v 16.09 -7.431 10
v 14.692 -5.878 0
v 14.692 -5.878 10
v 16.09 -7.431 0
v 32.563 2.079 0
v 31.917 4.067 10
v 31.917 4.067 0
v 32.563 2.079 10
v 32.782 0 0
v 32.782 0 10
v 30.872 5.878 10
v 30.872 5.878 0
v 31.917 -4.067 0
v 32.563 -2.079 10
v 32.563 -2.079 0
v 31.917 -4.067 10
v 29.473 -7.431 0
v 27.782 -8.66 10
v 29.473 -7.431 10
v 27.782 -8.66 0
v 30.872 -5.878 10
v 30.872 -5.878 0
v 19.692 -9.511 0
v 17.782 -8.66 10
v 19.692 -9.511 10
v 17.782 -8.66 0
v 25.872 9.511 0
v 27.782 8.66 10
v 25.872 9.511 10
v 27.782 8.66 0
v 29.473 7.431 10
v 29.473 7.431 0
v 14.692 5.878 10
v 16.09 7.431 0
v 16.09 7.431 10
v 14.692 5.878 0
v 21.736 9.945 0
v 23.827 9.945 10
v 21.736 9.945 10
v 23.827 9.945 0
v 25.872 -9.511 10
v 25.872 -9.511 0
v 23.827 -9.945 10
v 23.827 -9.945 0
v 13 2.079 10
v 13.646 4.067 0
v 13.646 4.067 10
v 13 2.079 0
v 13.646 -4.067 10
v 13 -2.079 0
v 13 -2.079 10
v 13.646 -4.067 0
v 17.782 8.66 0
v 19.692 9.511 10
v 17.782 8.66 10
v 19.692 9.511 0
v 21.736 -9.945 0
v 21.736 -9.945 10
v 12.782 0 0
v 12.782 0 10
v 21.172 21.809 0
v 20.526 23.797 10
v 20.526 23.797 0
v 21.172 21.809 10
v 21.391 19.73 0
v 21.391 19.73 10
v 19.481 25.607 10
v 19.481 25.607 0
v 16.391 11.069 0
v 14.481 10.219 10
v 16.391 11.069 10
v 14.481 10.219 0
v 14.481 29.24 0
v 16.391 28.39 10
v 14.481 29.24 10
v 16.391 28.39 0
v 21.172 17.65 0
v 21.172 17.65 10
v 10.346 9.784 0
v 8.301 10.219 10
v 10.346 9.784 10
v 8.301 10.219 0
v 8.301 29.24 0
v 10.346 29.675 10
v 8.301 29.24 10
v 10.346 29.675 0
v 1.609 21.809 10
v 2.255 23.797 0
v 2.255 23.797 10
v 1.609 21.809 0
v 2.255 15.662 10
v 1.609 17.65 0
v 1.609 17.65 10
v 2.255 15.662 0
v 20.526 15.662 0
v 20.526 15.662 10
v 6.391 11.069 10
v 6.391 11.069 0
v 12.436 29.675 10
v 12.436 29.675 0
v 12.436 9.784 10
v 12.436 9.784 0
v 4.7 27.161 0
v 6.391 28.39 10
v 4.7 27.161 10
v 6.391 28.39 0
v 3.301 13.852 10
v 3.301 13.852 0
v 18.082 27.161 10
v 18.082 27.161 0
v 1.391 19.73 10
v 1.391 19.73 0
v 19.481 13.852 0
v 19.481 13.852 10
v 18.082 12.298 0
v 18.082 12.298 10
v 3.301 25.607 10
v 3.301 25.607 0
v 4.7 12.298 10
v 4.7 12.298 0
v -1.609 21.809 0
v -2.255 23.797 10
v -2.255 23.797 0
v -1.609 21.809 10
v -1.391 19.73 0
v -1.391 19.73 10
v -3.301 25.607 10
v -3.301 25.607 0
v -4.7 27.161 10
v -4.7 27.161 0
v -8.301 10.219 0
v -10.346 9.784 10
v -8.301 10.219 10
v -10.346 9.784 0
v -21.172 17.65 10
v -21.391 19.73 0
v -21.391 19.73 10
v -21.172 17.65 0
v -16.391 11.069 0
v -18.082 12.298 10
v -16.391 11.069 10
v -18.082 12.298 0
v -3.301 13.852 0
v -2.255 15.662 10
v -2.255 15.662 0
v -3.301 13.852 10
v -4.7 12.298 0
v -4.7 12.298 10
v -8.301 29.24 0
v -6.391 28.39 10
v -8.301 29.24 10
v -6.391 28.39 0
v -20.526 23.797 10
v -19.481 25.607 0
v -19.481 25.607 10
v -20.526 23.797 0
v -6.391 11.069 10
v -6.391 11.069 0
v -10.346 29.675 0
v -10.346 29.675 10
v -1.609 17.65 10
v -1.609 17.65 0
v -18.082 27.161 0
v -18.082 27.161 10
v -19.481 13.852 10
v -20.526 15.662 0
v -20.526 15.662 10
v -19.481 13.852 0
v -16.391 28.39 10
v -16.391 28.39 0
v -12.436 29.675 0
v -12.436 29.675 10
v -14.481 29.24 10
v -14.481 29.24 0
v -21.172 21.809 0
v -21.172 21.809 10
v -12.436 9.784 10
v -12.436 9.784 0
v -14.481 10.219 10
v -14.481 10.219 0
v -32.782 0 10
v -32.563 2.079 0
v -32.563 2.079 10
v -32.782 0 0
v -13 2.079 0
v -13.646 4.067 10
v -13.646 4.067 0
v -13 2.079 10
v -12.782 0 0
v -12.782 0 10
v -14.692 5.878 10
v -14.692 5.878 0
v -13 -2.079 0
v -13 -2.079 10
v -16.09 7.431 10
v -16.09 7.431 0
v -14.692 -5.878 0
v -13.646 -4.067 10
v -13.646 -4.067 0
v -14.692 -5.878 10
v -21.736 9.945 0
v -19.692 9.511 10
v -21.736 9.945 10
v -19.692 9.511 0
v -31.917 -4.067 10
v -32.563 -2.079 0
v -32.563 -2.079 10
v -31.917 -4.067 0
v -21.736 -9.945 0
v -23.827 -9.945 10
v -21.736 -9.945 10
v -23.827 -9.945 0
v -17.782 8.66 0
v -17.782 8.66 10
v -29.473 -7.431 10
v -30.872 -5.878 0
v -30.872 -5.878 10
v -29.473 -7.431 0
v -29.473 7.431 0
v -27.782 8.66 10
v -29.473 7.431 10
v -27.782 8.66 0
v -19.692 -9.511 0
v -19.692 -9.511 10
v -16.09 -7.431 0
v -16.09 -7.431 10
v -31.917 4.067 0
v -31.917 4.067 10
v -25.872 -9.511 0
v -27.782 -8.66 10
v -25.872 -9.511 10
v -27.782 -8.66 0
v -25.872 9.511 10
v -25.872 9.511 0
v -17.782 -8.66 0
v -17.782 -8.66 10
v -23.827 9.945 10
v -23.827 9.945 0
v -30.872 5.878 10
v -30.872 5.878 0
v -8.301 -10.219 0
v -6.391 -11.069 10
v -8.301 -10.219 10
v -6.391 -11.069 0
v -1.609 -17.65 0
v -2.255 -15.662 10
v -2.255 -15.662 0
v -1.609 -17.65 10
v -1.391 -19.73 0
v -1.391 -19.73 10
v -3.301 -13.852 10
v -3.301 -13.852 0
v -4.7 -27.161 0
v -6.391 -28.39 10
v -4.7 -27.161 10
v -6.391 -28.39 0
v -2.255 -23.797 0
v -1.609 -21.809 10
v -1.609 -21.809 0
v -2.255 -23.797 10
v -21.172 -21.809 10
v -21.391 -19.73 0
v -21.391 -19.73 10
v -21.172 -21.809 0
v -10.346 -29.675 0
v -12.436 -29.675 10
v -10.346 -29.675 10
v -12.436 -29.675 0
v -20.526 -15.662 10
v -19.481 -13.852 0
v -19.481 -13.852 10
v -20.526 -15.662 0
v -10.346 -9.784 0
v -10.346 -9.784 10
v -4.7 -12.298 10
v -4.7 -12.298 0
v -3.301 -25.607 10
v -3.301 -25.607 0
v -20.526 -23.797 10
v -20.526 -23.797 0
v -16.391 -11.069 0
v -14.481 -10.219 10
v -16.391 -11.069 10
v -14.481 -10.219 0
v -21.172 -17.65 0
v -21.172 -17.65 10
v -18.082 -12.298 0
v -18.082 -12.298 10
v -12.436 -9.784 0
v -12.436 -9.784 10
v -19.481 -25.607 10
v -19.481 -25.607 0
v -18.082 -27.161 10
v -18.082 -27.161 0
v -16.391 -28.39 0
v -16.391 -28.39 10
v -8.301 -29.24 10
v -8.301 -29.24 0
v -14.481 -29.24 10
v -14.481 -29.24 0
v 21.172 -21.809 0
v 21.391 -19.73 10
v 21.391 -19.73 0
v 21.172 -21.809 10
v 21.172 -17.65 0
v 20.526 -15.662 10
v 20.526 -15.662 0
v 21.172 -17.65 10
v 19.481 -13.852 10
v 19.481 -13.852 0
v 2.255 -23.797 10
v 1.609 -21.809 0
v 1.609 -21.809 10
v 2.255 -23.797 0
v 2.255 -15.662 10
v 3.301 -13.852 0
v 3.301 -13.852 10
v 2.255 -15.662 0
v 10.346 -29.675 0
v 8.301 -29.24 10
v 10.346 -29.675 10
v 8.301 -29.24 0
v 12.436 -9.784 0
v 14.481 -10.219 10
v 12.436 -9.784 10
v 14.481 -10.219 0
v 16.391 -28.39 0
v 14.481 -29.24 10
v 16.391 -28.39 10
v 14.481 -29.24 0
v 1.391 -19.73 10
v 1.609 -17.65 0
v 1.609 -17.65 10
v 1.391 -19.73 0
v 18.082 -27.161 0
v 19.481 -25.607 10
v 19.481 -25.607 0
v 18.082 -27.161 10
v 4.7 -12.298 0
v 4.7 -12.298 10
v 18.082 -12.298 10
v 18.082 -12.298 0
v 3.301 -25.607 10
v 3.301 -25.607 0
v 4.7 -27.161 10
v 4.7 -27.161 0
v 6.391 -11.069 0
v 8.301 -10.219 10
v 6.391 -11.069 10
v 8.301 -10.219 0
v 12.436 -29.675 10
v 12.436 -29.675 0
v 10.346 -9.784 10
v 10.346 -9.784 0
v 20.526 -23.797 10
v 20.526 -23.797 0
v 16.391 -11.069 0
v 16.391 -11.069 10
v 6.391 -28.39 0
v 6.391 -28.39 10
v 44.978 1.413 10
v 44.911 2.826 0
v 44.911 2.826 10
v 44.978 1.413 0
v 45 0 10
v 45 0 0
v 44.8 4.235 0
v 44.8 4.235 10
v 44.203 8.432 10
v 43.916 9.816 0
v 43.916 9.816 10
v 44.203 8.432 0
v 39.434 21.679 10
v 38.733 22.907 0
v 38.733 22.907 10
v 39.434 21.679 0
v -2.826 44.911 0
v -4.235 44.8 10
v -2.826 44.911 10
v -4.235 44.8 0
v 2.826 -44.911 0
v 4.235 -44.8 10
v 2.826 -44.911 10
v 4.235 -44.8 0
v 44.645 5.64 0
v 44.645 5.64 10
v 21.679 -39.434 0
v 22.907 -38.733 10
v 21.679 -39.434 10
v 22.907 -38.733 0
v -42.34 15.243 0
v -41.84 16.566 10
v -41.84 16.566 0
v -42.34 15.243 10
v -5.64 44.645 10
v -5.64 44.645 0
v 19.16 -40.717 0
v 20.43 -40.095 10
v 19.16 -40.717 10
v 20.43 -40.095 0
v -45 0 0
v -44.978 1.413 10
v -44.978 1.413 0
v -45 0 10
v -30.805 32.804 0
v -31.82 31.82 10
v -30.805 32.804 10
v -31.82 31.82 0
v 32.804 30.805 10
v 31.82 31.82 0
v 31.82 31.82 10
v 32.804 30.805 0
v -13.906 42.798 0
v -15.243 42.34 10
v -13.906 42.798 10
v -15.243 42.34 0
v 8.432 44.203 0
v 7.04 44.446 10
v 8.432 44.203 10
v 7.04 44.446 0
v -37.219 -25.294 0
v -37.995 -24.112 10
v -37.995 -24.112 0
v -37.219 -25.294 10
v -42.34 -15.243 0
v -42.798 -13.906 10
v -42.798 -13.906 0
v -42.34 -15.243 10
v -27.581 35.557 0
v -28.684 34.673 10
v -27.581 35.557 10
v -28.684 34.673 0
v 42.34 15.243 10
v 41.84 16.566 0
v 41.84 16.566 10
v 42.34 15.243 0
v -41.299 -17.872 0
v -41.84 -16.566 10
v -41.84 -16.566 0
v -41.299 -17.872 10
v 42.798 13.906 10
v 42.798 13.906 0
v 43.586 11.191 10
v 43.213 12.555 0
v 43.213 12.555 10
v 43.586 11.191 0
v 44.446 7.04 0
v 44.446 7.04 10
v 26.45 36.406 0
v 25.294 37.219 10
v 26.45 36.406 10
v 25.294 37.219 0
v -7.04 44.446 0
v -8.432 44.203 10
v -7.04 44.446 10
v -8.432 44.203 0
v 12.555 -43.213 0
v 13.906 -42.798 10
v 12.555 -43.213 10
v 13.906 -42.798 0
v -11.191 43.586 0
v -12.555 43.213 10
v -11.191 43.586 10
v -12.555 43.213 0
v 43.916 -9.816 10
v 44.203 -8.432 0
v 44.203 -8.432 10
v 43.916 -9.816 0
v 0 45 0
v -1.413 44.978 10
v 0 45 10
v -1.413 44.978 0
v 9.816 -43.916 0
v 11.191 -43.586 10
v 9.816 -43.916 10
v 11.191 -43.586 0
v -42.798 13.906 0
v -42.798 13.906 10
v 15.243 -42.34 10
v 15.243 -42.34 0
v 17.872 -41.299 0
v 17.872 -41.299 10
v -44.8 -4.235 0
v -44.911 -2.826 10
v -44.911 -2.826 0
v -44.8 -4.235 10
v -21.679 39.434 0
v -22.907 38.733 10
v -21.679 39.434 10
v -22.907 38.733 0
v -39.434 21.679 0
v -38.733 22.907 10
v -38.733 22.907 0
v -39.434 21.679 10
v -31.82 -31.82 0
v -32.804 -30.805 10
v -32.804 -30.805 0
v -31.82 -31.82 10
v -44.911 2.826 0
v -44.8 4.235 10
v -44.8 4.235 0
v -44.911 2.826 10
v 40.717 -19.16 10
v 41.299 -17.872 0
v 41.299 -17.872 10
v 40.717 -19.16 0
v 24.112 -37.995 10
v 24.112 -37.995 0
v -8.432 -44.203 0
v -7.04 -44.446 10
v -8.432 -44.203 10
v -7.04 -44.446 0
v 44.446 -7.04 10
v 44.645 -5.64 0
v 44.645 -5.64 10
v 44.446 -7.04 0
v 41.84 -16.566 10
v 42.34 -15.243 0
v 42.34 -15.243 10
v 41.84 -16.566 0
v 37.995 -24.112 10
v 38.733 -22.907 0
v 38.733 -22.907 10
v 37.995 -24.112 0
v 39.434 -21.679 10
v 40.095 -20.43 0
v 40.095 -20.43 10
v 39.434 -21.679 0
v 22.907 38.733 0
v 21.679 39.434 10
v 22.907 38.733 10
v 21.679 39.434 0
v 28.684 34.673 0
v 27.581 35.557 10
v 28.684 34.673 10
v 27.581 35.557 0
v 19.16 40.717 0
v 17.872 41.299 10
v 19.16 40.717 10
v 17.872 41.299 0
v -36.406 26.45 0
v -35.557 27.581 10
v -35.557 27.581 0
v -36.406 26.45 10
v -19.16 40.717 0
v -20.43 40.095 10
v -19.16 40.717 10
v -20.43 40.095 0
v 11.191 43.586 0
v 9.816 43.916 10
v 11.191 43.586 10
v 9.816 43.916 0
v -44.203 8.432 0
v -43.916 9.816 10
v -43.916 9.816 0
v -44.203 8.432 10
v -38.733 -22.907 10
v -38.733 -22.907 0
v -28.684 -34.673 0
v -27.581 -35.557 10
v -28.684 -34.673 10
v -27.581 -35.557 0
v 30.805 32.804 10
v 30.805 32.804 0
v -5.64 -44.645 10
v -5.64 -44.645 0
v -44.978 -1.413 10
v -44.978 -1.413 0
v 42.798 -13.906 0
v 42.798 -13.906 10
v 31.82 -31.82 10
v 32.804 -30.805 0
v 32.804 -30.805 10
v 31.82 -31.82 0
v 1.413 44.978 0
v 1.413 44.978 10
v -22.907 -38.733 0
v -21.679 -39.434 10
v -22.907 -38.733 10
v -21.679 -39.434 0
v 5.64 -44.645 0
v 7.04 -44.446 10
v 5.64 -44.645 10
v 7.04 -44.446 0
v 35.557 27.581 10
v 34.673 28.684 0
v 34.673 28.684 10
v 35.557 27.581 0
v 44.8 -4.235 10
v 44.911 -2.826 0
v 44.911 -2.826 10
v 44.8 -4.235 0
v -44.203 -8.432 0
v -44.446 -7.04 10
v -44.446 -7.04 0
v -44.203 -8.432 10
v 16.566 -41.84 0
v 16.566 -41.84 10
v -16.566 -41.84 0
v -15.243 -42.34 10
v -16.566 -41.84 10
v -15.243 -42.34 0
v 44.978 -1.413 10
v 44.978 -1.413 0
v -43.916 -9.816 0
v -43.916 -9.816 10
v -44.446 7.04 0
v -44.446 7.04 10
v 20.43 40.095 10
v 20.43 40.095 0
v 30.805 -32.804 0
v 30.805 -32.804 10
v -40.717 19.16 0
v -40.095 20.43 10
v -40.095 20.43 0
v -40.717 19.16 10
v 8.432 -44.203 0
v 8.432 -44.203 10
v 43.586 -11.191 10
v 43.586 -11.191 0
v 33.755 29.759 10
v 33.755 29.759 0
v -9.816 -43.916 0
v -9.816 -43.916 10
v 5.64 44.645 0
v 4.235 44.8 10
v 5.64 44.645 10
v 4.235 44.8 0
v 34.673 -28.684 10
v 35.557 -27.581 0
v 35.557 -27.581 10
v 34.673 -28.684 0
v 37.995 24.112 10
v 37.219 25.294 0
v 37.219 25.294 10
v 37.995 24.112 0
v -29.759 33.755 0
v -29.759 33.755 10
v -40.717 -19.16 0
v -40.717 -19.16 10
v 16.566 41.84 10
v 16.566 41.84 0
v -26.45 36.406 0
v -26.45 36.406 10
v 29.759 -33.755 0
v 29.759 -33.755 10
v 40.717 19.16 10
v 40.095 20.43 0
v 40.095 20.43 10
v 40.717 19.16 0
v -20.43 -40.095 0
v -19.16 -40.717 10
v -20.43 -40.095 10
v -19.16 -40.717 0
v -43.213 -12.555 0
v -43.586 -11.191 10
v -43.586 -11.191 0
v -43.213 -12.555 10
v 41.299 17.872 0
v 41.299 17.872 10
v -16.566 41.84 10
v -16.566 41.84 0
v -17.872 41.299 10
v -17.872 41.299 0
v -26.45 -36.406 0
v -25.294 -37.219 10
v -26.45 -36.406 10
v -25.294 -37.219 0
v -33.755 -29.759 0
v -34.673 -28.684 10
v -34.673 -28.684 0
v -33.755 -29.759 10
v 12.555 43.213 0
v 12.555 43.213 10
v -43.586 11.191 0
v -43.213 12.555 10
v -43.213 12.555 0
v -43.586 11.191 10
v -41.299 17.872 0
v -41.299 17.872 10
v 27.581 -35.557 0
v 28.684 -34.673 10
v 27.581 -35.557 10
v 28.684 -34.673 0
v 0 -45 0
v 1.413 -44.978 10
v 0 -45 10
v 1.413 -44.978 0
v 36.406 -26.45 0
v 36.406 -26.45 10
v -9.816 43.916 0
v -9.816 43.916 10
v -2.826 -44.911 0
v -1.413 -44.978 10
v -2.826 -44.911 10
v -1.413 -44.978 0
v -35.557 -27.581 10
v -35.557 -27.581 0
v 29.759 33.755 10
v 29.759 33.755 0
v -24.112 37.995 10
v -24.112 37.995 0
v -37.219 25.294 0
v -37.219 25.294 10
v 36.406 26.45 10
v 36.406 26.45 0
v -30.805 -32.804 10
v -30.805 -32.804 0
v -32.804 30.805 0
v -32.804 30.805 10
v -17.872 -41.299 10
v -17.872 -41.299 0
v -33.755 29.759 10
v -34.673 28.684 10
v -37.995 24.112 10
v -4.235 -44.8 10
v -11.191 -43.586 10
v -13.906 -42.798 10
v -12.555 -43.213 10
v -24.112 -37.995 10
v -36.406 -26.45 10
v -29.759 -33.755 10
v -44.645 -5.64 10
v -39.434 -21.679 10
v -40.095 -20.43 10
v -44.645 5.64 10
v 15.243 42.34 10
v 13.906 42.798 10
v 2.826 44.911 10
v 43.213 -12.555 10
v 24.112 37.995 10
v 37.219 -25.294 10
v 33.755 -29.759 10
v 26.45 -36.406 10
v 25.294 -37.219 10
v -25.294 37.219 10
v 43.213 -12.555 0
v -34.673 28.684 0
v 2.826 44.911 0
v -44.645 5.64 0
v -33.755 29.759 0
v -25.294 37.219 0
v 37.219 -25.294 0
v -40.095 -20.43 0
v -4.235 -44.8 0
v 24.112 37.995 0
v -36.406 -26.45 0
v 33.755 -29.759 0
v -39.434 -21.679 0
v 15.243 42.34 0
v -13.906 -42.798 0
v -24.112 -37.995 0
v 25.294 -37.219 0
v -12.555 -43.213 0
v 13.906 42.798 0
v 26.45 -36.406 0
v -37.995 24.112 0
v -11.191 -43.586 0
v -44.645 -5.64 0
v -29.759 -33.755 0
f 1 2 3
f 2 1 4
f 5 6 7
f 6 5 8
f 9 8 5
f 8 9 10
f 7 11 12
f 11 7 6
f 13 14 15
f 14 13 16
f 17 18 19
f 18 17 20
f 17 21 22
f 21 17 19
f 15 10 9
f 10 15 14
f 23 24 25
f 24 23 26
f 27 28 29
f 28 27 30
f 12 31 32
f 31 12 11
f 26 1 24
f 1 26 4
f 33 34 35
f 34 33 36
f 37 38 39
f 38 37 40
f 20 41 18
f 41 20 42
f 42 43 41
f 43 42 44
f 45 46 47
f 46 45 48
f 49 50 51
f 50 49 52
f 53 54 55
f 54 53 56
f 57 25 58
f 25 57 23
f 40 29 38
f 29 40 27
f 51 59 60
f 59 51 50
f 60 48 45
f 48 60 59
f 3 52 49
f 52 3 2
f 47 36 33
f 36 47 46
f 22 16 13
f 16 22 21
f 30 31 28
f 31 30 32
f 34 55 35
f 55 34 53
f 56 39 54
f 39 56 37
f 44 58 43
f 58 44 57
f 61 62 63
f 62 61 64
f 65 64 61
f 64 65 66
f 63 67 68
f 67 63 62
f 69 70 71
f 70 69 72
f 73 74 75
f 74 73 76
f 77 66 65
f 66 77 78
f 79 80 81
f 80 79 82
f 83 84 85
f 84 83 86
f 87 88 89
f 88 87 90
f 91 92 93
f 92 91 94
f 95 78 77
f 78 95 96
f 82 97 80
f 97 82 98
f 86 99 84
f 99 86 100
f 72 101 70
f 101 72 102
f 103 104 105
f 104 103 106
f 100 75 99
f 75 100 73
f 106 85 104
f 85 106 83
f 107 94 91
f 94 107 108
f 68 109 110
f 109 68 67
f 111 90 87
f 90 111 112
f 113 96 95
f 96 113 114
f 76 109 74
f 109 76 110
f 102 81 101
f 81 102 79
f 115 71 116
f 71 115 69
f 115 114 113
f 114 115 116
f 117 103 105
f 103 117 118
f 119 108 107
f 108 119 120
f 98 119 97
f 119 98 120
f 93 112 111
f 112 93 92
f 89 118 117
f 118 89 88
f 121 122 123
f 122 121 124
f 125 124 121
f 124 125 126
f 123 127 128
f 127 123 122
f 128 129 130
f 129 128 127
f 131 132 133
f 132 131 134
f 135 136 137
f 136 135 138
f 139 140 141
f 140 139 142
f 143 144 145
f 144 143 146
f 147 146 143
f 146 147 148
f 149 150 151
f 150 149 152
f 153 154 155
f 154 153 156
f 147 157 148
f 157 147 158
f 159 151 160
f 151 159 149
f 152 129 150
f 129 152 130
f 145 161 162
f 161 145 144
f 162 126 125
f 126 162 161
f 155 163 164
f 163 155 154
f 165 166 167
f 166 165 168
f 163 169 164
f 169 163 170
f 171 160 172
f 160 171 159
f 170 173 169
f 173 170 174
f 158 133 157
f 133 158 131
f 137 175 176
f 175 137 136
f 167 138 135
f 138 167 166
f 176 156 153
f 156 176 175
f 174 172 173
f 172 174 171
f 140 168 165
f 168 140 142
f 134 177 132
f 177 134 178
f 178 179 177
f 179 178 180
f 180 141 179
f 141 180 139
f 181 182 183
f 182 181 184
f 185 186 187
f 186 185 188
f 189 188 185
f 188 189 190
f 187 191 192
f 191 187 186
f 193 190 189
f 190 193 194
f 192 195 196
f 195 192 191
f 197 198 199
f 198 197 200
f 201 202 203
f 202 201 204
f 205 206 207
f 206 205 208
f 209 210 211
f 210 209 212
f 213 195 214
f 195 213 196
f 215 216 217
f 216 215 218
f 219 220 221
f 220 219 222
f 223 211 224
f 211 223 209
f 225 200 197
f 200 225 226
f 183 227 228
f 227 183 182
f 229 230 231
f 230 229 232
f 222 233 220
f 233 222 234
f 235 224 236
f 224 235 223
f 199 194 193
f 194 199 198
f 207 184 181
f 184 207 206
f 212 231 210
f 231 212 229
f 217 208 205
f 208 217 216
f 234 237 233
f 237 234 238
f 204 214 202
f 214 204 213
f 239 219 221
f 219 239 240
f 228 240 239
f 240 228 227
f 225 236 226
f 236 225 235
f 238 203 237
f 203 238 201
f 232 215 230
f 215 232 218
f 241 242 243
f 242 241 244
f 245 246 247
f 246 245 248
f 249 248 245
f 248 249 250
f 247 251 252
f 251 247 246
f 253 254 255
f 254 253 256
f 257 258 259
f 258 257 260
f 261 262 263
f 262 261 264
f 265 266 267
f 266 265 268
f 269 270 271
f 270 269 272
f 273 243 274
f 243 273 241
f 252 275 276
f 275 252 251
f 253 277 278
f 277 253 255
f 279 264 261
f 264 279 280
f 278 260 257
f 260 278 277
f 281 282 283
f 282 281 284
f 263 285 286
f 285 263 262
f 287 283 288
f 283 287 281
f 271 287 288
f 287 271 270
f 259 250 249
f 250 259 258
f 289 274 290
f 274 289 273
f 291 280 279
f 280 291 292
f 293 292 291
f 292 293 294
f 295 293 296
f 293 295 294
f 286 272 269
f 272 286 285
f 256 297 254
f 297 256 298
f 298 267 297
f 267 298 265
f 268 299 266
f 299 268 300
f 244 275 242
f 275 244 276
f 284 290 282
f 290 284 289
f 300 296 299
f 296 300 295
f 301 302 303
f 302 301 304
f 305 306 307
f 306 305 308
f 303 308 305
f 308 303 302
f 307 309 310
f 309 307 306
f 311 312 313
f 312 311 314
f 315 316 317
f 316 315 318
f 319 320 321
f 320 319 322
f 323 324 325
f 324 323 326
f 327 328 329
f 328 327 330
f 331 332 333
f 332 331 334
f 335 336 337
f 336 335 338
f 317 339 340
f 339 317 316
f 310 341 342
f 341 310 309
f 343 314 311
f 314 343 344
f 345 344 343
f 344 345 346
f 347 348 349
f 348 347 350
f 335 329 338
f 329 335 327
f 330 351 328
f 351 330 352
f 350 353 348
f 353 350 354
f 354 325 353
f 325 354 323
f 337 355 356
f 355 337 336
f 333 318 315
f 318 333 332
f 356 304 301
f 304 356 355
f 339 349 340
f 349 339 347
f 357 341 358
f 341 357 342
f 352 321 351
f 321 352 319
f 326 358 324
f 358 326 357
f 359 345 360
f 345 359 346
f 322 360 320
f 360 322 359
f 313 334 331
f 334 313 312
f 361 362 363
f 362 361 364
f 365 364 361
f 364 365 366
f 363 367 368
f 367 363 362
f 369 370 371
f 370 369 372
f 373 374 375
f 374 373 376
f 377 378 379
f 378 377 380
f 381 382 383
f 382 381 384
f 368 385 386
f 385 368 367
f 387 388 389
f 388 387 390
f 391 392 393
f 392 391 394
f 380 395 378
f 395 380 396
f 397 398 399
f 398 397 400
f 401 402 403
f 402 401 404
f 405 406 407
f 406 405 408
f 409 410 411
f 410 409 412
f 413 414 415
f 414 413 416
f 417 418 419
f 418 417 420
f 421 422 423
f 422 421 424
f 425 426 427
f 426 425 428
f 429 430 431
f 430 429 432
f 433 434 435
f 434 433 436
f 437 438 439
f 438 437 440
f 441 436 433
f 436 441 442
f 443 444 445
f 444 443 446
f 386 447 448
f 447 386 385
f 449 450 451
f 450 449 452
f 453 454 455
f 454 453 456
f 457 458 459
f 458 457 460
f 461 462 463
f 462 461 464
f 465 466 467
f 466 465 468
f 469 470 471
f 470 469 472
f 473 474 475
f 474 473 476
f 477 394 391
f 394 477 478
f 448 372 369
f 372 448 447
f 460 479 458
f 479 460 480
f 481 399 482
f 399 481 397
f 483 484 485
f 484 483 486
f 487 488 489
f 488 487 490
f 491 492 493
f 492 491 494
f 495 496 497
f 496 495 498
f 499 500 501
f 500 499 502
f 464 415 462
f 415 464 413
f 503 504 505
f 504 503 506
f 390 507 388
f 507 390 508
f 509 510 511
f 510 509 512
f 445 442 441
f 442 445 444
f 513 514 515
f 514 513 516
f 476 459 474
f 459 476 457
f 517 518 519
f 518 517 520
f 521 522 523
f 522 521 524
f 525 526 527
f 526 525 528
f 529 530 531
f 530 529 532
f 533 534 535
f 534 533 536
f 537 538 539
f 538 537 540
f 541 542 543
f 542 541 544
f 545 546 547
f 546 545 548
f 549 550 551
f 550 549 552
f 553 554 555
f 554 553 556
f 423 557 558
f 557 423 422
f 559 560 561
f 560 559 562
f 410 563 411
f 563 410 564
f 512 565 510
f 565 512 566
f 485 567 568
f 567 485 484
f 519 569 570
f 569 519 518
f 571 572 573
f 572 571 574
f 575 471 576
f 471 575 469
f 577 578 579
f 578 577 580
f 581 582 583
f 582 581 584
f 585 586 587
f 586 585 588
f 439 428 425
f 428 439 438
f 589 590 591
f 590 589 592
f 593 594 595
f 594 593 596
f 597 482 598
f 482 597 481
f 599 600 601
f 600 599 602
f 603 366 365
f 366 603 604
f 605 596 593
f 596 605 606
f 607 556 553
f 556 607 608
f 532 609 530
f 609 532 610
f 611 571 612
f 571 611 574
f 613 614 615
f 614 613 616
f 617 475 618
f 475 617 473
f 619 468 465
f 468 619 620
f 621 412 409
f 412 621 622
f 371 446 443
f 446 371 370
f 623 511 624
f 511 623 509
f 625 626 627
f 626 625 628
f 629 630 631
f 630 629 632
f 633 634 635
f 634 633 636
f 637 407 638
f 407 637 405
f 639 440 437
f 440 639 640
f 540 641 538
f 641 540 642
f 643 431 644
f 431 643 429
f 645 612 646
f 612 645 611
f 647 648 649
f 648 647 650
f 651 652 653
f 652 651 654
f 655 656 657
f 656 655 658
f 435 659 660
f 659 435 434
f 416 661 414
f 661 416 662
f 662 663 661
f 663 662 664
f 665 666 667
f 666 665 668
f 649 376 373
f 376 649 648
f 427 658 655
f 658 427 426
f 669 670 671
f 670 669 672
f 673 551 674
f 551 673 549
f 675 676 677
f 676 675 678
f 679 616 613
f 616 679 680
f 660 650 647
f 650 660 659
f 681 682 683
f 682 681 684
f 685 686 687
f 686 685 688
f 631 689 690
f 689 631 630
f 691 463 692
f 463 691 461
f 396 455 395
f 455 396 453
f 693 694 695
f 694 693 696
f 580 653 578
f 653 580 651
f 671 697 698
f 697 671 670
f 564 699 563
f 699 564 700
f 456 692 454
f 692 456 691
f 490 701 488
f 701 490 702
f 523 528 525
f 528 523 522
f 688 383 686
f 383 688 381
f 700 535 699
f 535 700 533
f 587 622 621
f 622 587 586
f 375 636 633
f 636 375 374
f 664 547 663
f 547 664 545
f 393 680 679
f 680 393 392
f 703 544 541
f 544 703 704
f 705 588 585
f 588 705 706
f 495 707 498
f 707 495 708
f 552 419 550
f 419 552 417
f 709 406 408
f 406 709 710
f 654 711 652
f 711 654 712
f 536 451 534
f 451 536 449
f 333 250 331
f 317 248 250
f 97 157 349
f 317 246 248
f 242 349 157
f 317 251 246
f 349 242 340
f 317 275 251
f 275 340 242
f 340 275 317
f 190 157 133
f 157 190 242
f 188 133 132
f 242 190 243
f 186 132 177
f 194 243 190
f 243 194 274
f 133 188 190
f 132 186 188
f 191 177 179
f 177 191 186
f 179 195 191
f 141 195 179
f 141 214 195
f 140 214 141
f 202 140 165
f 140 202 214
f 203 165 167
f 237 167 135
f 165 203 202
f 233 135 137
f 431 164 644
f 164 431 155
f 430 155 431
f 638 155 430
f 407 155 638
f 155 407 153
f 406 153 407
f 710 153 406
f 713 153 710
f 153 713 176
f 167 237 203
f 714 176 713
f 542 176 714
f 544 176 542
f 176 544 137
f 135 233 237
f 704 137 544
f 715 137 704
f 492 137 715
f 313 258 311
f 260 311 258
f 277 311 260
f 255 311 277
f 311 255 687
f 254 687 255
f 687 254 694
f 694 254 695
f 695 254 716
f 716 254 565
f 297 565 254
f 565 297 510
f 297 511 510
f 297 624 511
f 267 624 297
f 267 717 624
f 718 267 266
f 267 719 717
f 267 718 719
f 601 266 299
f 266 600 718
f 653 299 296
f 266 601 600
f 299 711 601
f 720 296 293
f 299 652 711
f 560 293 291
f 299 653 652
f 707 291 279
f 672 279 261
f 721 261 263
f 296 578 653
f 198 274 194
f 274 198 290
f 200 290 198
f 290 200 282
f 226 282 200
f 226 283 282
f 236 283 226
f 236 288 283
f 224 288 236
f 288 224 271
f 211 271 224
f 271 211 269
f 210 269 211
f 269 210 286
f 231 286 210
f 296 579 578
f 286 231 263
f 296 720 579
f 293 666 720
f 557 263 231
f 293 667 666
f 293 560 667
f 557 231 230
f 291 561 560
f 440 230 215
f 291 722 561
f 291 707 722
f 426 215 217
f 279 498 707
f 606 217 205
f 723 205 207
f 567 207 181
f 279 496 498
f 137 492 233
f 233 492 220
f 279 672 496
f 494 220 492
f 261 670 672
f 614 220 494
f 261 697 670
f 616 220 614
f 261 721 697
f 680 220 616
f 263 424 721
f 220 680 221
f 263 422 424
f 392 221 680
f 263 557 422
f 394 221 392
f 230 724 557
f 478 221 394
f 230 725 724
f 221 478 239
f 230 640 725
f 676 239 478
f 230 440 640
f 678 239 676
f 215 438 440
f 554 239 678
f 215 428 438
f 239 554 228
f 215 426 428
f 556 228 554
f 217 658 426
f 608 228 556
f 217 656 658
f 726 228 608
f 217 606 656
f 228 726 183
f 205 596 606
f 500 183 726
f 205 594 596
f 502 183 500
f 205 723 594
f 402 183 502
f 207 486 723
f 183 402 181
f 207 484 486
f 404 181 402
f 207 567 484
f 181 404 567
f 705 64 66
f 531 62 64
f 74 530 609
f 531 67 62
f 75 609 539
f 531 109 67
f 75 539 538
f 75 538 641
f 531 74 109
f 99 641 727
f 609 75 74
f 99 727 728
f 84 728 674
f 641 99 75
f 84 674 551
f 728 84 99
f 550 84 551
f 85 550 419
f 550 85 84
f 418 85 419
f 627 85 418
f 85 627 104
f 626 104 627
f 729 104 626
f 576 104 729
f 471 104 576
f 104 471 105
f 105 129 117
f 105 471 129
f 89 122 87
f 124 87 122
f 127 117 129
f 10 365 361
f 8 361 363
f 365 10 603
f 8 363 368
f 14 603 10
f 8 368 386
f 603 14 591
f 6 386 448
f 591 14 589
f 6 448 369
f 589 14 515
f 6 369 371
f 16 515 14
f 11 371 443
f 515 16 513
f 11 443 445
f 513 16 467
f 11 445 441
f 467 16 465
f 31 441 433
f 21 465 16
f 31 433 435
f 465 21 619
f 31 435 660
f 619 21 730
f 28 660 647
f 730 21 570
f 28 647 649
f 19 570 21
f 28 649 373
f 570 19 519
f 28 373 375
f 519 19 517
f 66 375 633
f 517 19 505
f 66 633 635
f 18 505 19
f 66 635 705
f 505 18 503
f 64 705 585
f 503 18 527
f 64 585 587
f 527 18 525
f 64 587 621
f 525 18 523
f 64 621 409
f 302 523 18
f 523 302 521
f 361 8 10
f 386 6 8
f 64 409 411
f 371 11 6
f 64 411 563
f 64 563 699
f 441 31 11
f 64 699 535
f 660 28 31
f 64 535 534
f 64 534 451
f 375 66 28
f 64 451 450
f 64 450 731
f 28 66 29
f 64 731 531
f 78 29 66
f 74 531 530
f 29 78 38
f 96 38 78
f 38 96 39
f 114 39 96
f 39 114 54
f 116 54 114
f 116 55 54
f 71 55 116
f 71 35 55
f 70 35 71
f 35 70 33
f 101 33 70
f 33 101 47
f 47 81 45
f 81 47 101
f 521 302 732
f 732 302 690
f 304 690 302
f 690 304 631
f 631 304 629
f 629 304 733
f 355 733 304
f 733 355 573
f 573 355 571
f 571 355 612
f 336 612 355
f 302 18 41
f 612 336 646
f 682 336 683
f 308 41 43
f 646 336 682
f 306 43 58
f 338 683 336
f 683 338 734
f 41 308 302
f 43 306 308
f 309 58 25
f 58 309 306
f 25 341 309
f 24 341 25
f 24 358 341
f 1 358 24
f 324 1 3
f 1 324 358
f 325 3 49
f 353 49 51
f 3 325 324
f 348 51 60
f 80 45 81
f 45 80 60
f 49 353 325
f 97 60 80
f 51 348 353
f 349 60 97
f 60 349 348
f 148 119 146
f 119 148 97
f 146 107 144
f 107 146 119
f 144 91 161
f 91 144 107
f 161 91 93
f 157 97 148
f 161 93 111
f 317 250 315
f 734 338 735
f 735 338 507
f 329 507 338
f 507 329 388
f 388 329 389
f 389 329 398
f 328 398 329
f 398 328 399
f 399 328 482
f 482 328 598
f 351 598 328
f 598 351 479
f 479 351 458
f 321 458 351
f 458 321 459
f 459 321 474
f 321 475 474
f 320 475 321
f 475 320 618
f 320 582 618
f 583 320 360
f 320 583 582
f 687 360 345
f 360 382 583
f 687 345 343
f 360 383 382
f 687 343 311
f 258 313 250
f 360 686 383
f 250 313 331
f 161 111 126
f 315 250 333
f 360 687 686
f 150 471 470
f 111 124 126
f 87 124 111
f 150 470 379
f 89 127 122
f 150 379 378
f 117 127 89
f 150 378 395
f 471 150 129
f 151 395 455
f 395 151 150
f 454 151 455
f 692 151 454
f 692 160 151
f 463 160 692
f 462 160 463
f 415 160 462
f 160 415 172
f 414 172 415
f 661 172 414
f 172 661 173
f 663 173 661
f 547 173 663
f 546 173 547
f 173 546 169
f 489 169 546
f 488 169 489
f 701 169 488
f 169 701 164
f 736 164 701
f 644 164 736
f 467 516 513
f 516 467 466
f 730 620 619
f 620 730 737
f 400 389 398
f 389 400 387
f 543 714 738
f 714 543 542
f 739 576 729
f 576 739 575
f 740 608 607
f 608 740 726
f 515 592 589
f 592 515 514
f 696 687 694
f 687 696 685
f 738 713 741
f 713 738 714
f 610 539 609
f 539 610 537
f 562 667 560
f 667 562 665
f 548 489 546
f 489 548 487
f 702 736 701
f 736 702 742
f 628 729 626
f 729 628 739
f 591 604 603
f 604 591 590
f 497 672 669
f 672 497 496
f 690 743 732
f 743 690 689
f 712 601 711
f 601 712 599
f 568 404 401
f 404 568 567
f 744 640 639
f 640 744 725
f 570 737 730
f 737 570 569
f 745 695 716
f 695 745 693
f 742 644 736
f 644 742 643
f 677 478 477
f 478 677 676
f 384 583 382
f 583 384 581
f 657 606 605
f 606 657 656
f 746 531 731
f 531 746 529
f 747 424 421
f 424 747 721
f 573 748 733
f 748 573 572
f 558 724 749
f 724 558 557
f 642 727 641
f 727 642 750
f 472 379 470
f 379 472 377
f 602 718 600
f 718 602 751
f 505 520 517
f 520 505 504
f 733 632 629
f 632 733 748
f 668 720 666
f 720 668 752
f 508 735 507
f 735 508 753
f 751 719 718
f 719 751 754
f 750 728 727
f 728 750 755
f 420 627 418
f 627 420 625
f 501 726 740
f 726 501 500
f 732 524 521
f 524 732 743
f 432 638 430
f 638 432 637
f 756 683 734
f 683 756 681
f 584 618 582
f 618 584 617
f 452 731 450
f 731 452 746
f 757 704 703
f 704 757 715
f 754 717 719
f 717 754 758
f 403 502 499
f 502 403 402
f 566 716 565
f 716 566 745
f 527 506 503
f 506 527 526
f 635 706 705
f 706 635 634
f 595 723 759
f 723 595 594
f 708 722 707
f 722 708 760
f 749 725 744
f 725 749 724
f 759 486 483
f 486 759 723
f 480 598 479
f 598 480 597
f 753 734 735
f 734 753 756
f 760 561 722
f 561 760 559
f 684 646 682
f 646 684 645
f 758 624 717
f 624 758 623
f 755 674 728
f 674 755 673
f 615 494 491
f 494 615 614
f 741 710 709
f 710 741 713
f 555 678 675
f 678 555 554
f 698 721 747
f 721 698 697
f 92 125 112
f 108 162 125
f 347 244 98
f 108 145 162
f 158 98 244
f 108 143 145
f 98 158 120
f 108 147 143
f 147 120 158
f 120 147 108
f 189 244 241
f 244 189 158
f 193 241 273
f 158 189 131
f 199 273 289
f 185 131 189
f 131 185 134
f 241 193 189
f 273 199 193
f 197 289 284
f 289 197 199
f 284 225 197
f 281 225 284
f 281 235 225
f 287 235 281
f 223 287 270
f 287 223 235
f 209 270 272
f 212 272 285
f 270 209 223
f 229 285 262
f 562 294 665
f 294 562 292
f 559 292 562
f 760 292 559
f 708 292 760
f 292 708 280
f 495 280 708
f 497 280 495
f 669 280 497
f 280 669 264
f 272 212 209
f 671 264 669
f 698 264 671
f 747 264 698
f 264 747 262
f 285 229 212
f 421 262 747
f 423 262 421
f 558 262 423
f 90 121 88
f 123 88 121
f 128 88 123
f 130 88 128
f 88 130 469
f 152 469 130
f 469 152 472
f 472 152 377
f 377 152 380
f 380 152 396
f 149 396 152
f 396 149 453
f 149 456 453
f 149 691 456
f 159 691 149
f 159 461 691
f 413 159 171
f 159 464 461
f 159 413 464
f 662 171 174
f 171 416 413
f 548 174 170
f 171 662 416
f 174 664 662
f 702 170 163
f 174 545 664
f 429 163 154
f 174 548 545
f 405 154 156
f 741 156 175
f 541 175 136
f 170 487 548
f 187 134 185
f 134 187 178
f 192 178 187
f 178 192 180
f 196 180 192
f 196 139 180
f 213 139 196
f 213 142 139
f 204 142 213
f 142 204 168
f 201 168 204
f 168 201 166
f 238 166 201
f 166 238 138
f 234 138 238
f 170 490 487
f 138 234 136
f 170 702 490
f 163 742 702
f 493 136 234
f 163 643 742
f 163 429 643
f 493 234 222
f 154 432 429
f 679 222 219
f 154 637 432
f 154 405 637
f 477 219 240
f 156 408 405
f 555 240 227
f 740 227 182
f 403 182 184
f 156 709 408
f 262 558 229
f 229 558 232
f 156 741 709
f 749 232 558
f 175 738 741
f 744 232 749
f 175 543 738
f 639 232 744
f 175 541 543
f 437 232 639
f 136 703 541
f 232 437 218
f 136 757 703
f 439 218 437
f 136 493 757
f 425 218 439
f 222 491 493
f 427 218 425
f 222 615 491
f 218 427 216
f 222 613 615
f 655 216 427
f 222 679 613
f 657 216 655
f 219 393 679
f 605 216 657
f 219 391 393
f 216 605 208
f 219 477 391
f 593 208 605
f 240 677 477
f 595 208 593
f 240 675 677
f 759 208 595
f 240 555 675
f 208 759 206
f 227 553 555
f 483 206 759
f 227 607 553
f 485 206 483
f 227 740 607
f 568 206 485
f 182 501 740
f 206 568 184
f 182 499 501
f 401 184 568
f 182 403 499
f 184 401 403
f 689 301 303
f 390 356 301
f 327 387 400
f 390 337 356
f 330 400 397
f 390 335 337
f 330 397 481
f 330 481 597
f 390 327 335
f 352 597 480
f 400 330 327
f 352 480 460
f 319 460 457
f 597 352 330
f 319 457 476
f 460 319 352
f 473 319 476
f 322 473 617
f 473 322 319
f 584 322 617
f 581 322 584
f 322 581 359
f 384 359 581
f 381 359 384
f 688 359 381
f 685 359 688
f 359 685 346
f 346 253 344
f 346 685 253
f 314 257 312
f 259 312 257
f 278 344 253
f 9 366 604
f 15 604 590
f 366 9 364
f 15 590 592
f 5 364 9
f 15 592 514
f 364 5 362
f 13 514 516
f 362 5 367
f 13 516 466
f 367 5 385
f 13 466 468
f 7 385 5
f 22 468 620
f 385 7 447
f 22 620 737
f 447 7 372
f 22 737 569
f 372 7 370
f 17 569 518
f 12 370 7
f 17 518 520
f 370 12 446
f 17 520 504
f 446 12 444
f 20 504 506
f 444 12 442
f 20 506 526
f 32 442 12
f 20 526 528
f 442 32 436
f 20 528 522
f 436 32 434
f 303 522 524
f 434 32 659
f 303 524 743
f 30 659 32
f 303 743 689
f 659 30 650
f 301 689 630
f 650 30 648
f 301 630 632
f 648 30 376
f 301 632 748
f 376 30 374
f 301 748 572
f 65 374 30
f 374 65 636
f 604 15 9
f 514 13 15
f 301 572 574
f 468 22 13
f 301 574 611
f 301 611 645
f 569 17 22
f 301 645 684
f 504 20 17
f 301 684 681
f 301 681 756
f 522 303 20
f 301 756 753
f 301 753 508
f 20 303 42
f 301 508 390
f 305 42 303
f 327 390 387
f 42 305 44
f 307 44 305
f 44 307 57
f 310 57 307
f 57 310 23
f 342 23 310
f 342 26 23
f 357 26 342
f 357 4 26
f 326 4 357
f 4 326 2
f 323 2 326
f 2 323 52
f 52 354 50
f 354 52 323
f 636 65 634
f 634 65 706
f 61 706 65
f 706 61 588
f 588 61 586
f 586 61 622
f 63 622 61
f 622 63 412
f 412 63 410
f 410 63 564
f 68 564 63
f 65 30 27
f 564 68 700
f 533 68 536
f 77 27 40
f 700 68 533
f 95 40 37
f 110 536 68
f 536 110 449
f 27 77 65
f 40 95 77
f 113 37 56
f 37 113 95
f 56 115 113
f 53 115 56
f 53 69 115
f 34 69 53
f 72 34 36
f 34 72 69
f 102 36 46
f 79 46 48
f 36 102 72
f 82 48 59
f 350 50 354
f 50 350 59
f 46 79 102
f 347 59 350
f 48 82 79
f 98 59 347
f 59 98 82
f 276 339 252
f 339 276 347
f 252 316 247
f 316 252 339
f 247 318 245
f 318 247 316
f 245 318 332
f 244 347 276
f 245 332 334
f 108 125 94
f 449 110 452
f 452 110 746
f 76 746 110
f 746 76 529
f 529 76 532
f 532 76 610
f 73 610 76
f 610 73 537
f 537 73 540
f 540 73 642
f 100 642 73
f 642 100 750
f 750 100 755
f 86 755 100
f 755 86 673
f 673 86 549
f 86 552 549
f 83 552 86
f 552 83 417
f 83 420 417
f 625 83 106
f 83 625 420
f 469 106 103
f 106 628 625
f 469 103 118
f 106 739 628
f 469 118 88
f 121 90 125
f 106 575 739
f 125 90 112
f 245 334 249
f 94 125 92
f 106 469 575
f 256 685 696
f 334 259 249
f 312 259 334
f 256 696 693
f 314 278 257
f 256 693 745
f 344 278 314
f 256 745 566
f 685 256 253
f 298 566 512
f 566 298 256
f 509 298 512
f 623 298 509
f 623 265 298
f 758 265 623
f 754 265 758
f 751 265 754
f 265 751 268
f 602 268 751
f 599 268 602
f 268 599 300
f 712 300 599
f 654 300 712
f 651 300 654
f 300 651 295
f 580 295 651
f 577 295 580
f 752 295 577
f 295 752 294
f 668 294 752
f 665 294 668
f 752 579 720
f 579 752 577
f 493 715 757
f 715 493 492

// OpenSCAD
rad1 = 90;
rad2 = 20;
gaten = 6;
// code
d = (rad1 + rad2)/(1+sqrt(2));
difference()
{
 cylinder(r=rad1/2, h=10, $fn=200);
 for(i=[0:gaten])
 {

translate([d/2*cos(i*360/gaten),d/2*sin(i*360/gaten),-0.5])
 cylinder(r=rad2/2,h=11);
 }
}
